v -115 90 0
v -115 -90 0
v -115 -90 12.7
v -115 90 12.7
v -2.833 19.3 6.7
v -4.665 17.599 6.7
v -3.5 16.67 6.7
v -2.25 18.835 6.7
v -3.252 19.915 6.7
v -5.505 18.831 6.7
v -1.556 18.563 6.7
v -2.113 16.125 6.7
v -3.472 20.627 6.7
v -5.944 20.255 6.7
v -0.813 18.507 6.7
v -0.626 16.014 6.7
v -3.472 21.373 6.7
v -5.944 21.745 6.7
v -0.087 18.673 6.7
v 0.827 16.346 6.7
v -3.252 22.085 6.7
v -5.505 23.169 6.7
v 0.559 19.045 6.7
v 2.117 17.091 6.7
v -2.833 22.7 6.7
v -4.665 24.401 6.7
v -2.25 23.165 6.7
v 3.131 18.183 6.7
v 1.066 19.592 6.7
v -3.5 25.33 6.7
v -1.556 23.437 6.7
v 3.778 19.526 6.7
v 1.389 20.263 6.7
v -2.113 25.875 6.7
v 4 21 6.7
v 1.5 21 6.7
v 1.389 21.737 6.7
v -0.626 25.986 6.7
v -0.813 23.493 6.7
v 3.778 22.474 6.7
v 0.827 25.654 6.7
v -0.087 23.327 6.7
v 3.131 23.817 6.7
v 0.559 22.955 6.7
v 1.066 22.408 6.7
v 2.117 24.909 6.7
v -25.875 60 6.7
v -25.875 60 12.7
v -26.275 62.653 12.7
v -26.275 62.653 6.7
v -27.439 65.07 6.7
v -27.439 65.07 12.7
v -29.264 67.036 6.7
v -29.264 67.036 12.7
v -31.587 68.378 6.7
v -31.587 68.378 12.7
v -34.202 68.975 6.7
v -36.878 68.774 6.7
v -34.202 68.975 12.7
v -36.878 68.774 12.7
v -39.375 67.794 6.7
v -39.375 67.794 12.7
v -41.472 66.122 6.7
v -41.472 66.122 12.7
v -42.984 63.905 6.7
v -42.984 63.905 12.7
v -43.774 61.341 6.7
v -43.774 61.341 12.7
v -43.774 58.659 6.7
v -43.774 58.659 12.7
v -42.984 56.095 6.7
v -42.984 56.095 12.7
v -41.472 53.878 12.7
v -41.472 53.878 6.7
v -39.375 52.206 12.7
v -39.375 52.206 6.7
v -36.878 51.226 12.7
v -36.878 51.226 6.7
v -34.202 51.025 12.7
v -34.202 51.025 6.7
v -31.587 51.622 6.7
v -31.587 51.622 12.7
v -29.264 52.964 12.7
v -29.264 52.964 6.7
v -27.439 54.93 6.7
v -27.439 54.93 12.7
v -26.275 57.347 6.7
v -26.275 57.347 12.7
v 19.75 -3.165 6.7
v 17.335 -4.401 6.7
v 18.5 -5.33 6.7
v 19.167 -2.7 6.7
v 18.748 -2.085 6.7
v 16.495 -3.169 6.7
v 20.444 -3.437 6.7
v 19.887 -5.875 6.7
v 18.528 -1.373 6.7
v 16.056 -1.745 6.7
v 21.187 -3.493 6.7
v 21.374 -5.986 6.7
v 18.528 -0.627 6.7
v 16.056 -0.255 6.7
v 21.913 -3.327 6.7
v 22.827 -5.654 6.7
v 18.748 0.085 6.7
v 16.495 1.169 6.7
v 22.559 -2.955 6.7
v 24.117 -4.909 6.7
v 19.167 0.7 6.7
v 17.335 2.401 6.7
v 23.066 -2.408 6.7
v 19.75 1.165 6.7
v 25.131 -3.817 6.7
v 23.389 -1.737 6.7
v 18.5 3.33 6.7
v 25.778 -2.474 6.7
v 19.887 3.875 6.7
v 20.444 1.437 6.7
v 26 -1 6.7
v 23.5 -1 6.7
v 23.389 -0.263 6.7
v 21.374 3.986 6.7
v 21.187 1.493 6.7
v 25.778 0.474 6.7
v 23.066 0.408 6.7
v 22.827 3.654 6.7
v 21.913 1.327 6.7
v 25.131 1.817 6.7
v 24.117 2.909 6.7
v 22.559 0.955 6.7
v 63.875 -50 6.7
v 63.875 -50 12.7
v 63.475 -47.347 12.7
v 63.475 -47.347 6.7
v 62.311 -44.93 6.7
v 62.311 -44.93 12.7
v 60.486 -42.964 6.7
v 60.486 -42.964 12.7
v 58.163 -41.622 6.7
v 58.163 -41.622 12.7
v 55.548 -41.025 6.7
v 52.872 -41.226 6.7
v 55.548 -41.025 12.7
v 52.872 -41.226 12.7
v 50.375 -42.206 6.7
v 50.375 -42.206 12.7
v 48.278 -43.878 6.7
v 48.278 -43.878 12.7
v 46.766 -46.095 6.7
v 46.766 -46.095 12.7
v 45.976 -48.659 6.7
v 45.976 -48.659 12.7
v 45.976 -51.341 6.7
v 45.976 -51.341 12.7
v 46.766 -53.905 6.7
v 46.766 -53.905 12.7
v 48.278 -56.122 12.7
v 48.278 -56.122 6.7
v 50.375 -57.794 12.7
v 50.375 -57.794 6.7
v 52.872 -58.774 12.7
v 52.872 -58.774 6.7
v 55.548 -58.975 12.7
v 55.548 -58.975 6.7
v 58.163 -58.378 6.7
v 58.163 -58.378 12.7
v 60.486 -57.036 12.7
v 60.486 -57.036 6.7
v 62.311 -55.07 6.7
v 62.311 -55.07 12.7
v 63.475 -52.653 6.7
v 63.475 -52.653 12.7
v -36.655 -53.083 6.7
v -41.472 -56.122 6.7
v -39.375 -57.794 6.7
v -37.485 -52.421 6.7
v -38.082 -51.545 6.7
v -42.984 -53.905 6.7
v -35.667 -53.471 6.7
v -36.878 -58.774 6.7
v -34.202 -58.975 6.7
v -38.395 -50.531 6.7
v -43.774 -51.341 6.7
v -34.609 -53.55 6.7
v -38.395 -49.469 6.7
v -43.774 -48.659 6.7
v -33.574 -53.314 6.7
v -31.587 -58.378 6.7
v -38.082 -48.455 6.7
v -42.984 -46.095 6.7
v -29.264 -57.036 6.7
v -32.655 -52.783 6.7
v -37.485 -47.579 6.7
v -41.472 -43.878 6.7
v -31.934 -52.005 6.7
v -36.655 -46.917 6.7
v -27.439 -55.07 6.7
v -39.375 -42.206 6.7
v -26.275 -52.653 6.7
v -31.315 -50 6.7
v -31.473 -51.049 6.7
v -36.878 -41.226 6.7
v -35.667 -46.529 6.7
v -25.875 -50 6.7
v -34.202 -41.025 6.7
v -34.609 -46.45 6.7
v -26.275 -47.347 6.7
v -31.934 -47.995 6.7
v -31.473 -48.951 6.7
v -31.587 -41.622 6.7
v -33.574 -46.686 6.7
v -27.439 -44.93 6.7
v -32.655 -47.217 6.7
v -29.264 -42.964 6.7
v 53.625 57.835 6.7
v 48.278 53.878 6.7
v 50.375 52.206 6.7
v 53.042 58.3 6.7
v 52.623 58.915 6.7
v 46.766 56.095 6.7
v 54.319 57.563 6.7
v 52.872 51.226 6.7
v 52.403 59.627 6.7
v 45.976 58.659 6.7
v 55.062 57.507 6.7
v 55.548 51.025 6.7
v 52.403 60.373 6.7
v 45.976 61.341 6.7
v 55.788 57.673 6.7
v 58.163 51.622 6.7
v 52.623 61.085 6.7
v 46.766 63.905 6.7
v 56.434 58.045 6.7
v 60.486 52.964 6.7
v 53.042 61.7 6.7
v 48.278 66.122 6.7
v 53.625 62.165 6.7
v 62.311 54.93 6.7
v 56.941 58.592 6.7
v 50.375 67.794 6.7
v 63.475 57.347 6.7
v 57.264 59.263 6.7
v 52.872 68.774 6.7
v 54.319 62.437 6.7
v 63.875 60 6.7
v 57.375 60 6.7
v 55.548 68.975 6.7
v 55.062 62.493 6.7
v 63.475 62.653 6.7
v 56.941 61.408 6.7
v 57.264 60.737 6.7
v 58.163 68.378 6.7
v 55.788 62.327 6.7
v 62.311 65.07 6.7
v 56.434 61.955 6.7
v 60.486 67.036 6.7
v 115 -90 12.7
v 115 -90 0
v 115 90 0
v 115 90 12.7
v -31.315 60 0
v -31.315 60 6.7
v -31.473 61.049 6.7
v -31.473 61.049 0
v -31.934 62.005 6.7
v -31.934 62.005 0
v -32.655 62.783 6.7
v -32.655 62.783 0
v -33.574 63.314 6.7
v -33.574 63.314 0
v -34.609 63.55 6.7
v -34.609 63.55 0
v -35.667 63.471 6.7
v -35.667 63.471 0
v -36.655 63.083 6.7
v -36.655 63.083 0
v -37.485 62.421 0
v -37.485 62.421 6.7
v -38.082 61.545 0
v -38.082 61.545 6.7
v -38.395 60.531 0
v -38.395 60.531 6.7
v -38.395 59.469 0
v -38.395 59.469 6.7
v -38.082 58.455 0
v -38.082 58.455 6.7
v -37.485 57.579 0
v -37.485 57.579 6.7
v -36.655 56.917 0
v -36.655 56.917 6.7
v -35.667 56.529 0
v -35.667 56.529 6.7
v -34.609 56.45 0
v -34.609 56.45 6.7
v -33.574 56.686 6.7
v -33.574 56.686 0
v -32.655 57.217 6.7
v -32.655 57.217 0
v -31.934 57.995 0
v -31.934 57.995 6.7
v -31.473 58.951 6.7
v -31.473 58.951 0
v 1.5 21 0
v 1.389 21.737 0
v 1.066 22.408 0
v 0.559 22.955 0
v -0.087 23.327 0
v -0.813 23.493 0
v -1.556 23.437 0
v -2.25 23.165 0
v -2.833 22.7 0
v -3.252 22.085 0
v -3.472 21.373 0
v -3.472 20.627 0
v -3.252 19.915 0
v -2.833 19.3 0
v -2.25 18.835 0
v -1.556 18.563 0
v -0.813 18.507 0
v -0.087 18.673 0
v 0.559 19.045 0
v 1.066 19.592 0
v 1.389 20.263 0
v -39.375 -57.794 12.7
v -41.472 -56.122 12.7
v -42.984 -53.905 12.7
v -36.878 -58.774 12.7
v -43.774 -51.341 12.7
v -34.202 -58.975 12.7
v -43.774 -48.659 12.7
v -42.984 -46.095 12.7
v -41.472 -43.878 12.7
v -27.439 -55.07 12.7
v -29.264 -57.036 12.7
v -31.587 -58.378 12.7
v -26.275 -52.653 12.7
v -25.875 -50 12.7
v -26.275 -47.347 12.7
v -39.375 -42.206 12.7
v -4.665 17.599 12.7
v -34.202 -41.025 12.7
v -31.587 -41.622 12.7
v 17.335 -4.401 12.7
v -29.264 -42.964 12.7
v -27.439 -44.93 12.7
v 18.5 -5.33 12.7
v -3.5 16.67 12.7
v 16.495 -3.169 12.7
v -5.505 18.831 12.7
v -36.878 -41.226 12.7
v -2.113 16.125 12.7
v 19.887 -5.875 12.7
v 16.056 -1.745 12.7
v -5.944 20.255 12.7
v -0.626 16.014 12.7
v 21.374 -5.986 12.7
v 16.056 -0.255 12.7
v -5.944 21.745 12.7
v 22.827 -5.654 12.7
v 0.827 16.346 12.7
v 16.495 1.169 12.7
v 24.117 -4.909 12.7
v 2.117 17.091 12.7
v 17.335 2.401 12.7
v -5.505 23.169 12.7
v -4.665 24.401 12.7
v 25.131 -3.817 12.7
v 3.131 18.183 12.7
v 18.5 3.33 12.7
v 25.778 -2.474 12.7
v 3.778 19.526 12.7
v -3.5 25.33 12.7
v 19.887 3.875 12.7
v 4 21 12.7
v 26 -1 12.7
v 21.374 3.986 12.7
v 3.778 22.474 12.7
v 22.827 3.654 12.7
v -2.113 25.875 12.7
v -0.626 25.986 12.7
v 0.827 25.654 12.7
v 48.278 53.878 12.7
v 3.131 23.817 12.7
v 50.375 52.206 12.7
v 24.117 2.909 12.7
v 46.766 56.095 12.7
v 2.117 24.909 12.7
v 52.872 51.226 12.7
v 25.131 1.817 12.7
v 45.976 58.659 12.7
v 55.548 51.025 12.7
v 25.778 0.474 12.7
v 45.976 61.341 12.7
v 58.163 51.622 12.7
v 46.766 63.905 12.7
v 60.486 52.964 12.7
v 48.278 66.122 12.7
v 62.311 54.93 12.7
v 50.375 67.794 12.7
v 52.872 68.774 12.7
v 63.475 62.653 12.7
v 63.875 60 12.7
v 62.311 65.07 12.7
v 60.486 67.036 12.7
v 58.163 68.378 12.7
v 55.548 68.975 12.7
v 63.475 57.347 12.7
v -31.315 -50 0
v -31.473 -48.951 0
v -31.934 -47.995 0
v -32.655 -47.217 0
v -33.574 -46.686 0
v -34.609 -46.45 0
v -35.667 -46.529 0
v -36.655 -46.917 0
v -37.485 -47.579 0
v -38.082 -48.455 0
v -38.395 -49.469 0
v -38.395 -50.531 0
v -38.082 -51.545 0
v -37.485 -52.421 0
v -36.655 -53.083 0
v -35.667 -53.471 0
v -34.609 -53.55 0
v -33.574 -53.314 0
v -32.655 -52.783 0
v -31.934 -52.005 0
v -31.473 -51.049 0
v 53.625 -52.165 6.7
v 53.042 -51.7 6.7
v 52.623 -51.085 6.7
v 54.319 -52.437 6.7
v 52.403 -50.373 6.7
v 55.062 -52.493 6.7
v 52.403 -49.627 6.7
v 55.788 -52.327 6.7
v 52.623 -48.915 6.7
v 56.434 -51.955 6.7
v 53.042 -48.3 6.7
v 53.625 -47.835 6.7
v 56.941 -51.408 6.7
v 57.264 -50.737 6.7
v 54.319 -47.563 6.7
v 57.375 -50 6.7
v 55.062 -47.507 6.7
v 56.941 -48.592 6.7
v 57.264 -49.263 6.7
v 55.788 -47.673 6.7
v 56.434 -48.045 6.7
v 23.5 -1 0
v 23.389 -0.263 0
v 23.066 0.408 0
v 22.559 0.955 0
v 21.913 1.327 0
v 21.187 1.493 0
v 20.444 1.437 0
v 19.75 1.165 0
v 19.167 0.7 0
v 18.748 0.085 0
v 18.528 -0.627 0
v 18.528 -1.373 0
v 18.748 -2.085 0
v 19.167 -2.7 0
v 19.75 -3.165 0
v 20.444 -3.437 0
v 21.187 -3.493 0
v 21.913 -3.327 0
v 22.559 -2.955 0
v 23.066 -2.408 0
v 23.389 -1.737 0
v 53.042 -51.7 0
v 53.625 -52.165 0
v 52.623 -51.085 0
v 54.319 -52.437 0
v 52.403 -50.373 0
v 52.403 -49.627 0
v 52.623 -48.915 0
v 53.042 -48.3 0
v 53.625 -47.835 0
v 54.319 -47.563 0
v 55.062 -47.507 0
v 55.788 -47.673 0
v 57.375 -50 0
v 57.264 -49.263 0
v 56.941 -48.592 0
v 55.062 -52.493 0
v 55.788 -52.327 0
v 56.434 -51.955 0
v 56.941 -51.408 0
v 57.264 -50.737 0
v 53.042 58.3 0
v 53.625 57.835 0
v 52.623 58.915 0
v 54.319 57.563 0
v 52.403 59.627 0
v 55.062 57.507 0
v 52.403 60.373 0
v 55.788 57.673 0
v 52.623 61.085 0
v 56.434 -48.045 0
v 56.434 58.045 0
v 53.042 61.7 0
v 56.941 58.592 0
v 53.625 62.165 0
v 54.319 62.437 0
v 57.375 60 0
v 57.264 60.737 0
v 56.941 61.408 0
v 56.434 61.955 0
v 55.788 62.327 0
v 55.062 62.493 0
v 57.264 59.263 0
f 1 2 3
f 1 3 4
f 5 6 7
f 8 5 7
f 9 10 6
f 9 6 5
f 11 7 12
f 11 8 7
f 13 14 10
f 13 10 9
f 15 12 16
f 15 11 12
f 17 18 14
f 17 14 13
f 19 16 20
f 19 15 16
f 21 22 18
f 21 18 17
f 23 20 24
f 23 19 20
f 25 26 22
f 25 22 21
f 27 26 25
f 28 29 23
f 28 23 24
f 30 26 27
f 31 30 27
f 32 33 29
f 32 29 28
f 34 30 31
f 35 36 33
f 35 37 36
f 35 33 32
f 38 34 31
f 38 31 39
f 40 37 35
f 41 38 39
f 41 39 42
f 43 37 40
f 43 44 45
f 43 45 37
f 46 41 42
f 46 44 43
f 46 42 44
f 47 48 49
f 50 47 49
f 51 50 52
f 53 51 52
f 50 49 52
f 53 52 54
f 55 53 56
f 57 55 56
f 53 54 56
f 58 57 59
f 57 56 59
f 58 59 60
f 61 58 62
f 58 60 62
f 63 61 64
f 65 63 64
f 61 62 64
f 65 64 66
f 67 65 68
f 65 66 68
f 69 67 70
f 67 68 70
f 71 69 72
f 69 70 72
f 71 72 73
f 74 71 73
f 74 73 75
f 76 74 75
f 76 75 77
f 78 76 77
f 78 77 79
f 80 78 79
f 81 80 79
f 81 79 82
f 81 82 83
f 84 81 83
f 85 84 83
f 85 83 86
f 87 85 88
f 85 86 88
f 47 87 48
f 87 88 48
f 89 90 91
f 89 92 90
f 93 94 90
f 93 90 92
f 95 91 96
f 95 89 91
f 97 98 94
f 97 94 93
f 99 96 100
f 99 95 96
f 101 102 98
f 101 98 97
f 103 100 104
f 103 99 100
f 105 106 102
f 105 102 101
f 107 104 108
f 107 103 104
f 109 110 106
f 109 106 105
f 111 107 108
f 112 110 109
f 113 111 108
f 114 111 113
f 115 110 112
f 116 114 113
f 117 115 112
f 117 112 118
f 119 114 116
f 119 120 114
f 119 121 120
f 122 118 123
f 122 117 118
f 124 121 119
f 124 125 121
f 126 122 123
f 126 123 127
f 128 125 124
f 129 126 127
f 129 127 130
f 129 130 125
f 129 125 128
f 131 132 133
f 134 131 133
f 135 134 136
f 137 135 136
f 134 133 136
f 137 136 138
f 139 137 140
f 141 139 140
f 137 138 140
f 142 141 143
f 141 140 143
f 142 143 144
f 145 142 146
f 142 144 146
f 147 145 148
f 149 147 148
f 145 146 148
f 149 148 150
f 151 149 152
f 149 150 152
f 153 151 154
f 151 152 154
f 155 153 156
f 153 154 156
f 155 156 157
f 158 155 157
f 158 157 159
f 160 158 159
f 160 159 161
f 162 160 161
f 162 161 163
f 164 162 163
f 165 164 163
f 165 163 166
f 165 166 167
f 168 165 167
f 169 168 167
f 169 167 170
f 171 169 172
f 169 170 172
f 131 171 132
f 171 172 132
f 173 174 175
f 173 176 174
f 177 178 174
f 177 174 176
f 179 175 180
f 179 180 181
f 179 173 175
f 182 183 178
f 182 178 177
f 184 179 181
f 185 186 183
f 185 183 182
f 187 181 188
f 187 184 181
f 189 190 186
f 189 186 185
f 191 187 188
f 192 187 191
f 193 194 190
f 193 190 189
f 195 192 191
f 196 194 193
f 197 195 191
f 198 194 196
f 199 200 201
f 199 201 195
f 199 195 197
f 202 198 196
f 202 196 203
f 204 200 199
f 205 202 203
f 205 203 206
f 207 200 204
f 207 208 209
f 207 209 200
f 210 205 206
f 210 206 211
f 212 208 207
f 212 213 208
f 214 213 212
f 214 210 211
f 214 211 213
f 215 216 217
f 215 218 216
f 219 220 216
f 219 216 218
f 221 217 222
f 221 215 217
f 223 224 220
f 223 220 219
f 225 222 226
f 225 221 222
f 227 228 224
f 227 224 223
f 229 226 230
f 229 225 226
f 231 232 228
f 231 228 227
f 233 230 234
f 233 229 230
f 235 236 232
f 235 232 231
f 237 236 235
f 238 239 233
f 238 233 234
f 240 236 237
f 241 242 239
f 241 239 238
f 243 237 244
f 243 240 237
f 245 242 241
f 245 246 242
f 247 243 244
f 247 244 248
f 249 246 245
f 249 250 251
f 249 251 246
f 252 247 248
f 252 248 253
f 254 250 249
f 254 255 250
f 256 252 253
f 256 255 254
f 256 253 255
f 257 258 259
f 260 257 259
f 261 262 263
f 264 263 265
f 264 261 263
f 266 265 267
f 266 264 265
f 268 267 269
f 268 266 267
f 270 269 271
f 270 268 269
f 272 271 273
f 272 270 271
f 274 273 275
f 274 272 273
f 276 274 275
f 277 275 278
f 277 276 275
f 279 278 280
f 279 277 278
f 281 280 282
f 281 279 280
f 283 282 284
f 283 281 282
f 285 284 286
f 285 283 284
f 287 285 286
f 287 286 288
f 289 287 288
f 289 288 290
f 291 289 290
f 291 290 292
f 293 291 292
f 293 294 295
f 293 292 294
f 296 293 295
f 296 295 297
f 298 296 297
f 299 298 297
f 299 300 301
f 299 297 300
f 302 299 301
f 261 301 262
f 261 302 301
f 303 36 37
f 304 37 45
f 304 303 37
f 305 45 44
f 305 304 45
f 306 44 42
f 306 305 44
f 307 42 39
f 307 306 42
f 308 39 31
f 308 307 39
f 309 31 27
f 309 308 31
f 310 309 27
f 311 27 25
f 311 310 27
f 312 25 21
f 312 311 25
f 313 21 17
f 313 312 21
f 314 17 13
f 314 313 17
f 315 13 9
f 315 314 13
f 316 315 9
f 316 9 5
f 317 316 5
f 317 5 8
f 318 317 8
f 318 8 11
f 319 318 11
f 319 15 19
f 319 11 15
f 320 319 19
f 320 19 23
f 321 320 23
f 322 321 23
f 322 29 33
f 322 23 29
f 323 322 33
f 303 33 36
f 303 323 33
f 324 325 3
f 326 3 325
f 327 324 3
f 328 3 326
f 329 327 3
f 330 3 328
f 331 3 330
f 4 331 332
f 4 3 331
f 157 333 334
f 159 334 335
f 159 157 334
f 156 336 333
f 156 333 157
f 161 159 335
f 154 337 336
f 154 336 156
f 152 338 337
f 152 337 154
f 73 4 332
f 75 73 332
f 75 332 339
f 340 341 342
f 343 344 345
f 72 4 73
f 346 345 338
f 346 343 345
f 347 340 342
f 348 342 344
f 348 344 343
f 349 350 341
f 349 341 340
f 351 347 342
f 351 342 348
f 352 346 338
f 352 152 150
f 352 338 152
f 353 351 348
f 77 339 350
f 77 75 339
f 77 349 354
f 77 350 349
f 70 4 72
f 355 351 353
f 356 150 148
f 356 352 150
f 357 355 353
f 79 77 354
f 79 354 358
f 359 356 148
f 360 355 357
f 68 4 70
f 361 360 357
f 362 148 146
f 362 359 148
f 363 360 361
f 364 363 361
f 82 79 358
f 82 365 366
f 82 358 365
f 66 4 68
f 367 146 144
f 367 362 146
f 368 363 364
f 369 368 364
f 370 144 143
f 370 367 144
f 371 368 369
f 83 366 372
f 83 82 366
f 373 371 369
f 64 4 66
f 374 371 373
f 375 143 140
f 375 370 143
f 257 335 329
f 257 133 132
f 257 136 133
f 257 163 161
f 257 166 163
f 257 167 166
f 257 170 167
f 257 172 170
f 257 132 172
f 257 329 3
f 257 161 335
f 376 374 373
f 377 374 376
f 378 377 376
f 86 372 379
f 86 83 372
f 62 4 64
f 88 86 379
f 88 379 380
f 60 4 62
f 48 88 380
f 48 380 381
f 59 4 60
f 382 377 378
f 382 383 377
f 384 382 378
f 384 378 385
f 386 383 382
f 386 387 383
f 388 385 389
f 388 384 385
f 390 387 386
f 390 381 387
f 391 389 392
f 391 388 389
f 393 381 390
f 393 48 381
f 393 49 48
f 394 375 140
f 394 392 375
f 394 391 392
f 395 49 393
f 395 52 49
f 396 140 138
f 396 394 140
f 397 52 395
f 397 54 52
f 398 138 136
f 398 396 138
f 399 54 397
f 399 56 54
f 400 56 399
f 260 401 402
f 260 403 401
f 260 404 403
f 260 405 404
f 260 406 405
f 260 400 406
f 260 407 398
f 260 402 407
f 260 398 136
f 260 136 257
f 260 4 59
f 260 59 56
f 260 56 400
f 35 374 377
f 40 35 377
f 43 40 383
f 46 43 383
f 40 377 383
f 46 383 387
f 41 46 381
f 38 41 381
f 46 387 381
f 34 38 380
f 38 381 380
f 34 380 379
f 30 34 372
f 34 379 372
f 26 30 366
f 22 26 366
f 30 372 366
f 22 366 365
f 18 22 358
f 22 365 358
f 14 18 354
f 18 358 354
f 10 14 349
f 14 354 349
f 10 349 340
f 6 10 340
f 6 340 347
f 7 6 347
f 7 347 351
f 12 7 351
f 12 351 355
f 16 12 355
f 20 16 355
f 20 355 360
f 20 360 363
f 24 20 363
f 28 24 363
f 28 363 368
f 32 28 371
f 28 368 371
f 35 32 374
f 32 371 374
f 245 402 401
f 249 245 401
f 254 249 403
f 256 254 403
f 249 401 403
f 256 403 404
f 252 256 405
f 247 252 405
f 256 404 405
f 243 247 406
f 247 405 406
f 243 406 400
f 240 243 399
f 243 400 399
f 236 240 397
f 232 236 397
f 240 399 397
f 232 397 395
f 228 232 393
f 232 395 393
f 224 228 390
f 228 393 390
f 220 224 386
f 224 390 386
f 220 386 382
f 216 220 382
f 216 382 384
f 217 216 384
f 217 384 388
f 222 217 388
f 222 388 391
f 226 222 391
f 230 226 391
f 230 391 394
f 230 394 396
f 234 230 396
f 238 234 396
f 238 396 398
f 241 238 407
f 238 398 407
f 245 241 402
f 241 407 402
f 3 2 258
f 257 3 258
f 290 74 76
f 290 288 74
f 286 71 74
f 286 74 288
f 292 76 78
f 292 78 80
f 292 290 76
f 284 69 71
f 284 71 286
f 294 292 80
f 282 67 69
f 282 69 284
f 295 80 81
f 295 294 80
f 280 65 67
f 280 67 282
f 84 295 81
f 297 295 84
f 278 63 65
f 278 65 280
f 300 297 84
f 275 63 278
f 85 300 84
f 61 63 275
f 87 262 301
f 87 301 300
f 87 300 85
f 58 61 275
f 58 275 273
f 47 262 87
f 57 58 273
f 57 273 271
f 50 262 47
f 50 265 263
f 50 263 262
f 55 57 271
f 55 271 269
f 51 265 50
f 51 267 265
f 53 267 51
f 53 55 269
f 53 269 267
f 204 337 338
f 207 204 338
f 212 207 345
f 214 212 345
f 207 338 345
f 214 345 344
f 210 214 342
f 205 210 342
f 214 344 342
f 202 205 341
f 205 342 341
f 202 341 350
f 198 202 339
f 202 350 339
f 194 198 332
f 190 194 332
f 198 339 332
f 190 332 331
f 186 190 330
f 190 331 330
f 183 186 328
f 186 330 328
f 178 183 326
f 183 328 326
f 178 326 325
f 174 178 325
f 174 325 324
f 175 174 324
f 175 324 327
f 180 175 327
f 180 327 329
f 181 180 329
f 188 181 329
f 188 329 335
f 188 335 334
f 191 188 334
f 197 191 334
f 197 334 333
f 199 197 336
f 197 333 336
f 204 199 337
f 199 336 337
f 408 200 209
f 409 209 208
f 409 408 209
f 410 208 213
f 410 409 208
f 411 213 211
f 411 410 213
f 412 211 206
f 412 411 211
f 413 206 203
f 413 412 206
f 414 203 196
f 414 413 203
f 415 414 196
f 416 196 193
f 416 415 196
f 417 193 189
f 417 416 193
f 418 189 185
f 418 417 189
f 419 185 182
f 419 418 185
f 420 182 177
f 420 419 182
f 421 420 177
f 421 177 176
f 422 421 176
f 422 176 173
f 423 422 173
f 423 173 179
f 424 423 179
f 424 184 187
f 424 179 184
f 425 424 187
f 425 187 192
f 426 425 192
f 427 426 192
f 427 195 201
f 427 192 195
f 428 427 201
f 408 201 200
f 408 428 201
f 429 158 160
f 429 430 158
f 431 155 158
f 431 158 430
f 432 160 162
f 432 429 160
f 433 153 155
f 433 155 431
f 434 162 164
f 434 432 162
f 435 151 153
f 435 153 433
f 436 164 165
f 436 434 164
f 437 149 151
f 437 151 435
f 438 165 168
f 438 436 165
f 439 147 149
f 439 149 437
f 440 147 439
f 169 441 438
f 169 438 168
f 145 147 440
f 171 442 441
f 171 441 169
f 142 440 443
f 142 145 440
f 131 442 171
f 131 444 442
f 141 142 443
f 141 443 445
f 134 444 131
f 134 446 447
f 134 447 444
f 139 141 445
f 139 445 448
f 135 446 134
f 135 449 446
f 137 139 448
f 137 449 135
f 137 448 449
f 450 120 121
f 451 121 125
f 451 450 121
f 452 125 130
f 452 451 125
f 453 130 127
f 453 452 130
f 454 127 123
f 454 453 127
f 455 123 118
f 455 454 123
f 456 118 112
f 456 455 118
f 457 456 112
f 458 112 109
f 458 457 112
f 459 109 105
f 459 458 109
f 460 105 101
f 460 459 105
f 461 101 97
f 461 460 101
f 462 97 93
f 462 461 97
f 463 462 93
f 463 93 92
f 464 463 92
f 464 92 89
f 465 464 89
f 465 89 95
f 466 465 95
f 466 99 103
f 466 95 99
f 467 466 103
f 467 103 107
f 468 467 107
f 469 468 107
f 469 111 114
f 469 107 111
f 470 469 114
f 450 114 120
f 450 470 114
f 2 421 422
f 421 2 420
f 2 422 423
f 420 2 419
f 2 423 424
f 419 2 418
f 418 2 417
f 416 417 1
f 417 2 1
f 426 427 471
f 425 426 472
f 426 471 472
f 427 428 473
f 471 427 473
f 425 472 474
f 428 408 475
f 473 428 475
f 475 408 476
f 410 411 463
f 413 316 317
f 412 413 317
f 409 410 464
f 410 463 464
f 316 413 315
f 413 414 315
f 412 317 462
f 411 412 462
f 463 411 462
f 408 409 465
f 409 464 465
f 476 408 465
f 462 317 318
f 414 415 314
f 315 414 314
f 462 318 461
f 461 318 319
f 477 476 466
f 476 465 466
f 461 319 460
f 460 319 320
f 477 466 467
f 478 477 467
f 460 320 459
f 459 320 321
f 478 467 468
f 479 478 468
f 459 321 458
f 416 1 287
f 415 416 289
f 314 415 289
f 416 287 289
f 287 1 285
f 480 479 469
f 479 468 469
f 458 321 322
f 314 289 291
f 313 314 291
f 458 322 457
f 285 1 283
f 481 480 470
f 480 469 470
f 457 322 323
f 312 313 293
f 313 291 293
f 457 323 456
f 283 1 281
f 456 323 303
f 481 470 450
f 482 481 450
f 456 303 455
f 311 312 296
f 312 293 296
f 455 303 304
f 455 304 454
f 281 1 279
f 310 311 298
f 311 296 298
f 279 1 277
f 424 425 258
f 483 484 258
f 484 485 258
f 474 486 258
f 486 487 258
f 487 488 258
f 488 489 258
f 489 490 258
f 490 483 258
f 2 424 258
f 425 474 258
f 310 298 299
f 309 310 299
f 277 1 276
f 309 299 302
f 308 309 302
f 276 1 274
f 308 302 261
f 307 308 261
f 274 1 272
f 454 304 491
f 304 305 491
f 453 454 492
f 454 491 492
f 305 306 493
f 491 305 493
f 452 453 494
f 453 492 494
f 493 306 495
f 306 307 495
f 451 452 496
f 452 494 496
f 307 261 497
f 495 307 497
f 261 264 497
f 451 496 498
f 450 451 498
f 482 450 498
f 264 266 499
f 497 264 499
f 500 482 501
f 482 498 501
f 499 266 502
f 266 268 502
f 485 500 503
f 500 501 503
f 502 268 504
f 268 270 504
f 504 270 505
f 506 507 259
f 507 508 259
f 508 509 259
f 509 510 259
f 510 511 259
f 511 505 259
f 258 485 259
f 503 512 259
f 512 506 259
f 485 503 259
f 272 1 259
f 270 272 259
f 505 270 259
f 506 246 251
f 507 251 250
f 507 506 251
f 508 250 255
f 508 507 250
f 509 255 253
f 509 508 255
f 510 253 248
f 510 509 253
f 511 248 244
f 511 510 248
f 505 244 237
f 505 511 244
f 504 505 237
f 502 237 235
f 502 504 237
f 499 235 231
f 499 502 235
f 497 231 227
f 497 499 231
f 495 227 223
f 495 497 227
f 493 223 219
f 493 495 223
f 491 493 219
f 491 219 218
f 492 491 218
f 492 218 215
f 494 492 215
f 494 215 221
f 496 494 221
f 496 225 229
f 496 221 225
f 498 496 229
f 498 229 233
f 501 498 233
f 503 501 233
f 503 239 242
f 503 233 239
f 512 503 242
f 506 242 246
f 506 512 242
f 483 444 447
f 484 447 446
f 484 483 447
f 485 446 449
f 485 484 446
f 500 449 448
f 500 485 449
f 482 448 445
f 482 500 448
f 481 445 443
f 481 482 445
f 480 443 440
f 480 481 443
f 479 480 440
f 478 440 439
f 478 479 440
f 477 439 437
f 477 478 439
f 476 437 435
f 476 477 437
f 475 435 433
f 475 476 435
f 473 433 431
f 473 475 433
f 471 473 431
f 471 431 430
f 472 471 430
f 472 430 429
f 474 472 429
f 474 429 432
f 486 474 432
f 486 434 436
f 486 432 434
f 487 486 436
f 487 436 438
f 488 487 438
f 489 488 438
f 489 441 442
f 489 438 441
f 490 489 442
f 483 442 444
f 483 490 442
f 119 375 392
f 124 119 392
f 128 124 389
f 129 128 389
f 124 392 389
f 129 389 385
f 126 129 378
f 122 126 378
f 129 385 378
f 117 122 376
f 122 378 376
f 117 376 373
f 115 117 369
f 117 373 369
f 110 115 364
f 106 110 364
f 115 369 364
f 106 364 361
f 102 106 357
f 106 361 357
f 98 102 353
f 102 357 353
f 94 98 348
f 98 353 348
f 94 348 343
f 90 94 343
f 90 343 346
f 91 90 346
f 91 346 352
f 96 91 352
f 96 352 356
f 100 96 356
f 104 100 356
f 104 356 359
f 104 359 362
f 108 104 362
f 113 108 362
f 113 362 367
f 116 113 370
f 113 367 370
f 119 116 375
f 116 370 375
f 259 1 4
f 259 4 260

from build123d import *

# Parameters (mm, degrees)
F0_W     = 230
F0_H     = 180
F0_R     = 3.56
F0_R_2   = 2.5
F1_DEPTH = 12.7
F2_R     = 9
F2_R_2   = 5
F3_DEPTH = 6


# Not quite as in the source:
# - a length typed as a fraction of an inch, garbled in the dataset ("3 / 203.2 mm" for 3/8 in), is restored


with BuildPart() as f1:
    # F0 (on Top) → F1 (new body)
    with BuildSketch(Plane.XY):
        Rectangle(F0_W, F0_H)
        with Locations((-34.875, -50)):
            Circle(F0_R, mode=Mode.SUBTRACT)
        with Locations((54.875, -50)):
            Circle(F0_R_2, mode=Mode.SUBTRACT)
        with Locations((21, -1)):
            Circle(F0_R_2, mode=Mode.SUBTRACT)
        with Locations((-1, 21)):
            Circle(F0_R_2, mode=Mode.SUBTRACT)
        with Locations((-34.875, 60)):
            Circle(F0_R, mode=Mode.SUBTRACT)
        with Locations((54.875, 60)):
            Circle(F0_R_2, mode=Mode.SUBTRACT)
    extrude(amount=F1_DEPTH)

    # F2 (on face) → F3 (cut)
    with BuildSketch(Plane.XY.offset(12.7)):
        with Locations((-34.875, 60)):
            Circle(F2_R)
        with Locations((54.875, 60)):
            Circle(F2_R)
        with Locations((-34.875, -50)):
            Circle(F2_R)
        with Locations((54.875, -50)):
            Circle(F2_R)
        with Locations((-1, 21)):
            Circle(F2_R_2)
        with Locations((21, -1)):
            Circle(F2_R_2)
    extrude(amount=-F3_DEPTH, mode=Mode.SUBTRACT)


solid = f1.part
